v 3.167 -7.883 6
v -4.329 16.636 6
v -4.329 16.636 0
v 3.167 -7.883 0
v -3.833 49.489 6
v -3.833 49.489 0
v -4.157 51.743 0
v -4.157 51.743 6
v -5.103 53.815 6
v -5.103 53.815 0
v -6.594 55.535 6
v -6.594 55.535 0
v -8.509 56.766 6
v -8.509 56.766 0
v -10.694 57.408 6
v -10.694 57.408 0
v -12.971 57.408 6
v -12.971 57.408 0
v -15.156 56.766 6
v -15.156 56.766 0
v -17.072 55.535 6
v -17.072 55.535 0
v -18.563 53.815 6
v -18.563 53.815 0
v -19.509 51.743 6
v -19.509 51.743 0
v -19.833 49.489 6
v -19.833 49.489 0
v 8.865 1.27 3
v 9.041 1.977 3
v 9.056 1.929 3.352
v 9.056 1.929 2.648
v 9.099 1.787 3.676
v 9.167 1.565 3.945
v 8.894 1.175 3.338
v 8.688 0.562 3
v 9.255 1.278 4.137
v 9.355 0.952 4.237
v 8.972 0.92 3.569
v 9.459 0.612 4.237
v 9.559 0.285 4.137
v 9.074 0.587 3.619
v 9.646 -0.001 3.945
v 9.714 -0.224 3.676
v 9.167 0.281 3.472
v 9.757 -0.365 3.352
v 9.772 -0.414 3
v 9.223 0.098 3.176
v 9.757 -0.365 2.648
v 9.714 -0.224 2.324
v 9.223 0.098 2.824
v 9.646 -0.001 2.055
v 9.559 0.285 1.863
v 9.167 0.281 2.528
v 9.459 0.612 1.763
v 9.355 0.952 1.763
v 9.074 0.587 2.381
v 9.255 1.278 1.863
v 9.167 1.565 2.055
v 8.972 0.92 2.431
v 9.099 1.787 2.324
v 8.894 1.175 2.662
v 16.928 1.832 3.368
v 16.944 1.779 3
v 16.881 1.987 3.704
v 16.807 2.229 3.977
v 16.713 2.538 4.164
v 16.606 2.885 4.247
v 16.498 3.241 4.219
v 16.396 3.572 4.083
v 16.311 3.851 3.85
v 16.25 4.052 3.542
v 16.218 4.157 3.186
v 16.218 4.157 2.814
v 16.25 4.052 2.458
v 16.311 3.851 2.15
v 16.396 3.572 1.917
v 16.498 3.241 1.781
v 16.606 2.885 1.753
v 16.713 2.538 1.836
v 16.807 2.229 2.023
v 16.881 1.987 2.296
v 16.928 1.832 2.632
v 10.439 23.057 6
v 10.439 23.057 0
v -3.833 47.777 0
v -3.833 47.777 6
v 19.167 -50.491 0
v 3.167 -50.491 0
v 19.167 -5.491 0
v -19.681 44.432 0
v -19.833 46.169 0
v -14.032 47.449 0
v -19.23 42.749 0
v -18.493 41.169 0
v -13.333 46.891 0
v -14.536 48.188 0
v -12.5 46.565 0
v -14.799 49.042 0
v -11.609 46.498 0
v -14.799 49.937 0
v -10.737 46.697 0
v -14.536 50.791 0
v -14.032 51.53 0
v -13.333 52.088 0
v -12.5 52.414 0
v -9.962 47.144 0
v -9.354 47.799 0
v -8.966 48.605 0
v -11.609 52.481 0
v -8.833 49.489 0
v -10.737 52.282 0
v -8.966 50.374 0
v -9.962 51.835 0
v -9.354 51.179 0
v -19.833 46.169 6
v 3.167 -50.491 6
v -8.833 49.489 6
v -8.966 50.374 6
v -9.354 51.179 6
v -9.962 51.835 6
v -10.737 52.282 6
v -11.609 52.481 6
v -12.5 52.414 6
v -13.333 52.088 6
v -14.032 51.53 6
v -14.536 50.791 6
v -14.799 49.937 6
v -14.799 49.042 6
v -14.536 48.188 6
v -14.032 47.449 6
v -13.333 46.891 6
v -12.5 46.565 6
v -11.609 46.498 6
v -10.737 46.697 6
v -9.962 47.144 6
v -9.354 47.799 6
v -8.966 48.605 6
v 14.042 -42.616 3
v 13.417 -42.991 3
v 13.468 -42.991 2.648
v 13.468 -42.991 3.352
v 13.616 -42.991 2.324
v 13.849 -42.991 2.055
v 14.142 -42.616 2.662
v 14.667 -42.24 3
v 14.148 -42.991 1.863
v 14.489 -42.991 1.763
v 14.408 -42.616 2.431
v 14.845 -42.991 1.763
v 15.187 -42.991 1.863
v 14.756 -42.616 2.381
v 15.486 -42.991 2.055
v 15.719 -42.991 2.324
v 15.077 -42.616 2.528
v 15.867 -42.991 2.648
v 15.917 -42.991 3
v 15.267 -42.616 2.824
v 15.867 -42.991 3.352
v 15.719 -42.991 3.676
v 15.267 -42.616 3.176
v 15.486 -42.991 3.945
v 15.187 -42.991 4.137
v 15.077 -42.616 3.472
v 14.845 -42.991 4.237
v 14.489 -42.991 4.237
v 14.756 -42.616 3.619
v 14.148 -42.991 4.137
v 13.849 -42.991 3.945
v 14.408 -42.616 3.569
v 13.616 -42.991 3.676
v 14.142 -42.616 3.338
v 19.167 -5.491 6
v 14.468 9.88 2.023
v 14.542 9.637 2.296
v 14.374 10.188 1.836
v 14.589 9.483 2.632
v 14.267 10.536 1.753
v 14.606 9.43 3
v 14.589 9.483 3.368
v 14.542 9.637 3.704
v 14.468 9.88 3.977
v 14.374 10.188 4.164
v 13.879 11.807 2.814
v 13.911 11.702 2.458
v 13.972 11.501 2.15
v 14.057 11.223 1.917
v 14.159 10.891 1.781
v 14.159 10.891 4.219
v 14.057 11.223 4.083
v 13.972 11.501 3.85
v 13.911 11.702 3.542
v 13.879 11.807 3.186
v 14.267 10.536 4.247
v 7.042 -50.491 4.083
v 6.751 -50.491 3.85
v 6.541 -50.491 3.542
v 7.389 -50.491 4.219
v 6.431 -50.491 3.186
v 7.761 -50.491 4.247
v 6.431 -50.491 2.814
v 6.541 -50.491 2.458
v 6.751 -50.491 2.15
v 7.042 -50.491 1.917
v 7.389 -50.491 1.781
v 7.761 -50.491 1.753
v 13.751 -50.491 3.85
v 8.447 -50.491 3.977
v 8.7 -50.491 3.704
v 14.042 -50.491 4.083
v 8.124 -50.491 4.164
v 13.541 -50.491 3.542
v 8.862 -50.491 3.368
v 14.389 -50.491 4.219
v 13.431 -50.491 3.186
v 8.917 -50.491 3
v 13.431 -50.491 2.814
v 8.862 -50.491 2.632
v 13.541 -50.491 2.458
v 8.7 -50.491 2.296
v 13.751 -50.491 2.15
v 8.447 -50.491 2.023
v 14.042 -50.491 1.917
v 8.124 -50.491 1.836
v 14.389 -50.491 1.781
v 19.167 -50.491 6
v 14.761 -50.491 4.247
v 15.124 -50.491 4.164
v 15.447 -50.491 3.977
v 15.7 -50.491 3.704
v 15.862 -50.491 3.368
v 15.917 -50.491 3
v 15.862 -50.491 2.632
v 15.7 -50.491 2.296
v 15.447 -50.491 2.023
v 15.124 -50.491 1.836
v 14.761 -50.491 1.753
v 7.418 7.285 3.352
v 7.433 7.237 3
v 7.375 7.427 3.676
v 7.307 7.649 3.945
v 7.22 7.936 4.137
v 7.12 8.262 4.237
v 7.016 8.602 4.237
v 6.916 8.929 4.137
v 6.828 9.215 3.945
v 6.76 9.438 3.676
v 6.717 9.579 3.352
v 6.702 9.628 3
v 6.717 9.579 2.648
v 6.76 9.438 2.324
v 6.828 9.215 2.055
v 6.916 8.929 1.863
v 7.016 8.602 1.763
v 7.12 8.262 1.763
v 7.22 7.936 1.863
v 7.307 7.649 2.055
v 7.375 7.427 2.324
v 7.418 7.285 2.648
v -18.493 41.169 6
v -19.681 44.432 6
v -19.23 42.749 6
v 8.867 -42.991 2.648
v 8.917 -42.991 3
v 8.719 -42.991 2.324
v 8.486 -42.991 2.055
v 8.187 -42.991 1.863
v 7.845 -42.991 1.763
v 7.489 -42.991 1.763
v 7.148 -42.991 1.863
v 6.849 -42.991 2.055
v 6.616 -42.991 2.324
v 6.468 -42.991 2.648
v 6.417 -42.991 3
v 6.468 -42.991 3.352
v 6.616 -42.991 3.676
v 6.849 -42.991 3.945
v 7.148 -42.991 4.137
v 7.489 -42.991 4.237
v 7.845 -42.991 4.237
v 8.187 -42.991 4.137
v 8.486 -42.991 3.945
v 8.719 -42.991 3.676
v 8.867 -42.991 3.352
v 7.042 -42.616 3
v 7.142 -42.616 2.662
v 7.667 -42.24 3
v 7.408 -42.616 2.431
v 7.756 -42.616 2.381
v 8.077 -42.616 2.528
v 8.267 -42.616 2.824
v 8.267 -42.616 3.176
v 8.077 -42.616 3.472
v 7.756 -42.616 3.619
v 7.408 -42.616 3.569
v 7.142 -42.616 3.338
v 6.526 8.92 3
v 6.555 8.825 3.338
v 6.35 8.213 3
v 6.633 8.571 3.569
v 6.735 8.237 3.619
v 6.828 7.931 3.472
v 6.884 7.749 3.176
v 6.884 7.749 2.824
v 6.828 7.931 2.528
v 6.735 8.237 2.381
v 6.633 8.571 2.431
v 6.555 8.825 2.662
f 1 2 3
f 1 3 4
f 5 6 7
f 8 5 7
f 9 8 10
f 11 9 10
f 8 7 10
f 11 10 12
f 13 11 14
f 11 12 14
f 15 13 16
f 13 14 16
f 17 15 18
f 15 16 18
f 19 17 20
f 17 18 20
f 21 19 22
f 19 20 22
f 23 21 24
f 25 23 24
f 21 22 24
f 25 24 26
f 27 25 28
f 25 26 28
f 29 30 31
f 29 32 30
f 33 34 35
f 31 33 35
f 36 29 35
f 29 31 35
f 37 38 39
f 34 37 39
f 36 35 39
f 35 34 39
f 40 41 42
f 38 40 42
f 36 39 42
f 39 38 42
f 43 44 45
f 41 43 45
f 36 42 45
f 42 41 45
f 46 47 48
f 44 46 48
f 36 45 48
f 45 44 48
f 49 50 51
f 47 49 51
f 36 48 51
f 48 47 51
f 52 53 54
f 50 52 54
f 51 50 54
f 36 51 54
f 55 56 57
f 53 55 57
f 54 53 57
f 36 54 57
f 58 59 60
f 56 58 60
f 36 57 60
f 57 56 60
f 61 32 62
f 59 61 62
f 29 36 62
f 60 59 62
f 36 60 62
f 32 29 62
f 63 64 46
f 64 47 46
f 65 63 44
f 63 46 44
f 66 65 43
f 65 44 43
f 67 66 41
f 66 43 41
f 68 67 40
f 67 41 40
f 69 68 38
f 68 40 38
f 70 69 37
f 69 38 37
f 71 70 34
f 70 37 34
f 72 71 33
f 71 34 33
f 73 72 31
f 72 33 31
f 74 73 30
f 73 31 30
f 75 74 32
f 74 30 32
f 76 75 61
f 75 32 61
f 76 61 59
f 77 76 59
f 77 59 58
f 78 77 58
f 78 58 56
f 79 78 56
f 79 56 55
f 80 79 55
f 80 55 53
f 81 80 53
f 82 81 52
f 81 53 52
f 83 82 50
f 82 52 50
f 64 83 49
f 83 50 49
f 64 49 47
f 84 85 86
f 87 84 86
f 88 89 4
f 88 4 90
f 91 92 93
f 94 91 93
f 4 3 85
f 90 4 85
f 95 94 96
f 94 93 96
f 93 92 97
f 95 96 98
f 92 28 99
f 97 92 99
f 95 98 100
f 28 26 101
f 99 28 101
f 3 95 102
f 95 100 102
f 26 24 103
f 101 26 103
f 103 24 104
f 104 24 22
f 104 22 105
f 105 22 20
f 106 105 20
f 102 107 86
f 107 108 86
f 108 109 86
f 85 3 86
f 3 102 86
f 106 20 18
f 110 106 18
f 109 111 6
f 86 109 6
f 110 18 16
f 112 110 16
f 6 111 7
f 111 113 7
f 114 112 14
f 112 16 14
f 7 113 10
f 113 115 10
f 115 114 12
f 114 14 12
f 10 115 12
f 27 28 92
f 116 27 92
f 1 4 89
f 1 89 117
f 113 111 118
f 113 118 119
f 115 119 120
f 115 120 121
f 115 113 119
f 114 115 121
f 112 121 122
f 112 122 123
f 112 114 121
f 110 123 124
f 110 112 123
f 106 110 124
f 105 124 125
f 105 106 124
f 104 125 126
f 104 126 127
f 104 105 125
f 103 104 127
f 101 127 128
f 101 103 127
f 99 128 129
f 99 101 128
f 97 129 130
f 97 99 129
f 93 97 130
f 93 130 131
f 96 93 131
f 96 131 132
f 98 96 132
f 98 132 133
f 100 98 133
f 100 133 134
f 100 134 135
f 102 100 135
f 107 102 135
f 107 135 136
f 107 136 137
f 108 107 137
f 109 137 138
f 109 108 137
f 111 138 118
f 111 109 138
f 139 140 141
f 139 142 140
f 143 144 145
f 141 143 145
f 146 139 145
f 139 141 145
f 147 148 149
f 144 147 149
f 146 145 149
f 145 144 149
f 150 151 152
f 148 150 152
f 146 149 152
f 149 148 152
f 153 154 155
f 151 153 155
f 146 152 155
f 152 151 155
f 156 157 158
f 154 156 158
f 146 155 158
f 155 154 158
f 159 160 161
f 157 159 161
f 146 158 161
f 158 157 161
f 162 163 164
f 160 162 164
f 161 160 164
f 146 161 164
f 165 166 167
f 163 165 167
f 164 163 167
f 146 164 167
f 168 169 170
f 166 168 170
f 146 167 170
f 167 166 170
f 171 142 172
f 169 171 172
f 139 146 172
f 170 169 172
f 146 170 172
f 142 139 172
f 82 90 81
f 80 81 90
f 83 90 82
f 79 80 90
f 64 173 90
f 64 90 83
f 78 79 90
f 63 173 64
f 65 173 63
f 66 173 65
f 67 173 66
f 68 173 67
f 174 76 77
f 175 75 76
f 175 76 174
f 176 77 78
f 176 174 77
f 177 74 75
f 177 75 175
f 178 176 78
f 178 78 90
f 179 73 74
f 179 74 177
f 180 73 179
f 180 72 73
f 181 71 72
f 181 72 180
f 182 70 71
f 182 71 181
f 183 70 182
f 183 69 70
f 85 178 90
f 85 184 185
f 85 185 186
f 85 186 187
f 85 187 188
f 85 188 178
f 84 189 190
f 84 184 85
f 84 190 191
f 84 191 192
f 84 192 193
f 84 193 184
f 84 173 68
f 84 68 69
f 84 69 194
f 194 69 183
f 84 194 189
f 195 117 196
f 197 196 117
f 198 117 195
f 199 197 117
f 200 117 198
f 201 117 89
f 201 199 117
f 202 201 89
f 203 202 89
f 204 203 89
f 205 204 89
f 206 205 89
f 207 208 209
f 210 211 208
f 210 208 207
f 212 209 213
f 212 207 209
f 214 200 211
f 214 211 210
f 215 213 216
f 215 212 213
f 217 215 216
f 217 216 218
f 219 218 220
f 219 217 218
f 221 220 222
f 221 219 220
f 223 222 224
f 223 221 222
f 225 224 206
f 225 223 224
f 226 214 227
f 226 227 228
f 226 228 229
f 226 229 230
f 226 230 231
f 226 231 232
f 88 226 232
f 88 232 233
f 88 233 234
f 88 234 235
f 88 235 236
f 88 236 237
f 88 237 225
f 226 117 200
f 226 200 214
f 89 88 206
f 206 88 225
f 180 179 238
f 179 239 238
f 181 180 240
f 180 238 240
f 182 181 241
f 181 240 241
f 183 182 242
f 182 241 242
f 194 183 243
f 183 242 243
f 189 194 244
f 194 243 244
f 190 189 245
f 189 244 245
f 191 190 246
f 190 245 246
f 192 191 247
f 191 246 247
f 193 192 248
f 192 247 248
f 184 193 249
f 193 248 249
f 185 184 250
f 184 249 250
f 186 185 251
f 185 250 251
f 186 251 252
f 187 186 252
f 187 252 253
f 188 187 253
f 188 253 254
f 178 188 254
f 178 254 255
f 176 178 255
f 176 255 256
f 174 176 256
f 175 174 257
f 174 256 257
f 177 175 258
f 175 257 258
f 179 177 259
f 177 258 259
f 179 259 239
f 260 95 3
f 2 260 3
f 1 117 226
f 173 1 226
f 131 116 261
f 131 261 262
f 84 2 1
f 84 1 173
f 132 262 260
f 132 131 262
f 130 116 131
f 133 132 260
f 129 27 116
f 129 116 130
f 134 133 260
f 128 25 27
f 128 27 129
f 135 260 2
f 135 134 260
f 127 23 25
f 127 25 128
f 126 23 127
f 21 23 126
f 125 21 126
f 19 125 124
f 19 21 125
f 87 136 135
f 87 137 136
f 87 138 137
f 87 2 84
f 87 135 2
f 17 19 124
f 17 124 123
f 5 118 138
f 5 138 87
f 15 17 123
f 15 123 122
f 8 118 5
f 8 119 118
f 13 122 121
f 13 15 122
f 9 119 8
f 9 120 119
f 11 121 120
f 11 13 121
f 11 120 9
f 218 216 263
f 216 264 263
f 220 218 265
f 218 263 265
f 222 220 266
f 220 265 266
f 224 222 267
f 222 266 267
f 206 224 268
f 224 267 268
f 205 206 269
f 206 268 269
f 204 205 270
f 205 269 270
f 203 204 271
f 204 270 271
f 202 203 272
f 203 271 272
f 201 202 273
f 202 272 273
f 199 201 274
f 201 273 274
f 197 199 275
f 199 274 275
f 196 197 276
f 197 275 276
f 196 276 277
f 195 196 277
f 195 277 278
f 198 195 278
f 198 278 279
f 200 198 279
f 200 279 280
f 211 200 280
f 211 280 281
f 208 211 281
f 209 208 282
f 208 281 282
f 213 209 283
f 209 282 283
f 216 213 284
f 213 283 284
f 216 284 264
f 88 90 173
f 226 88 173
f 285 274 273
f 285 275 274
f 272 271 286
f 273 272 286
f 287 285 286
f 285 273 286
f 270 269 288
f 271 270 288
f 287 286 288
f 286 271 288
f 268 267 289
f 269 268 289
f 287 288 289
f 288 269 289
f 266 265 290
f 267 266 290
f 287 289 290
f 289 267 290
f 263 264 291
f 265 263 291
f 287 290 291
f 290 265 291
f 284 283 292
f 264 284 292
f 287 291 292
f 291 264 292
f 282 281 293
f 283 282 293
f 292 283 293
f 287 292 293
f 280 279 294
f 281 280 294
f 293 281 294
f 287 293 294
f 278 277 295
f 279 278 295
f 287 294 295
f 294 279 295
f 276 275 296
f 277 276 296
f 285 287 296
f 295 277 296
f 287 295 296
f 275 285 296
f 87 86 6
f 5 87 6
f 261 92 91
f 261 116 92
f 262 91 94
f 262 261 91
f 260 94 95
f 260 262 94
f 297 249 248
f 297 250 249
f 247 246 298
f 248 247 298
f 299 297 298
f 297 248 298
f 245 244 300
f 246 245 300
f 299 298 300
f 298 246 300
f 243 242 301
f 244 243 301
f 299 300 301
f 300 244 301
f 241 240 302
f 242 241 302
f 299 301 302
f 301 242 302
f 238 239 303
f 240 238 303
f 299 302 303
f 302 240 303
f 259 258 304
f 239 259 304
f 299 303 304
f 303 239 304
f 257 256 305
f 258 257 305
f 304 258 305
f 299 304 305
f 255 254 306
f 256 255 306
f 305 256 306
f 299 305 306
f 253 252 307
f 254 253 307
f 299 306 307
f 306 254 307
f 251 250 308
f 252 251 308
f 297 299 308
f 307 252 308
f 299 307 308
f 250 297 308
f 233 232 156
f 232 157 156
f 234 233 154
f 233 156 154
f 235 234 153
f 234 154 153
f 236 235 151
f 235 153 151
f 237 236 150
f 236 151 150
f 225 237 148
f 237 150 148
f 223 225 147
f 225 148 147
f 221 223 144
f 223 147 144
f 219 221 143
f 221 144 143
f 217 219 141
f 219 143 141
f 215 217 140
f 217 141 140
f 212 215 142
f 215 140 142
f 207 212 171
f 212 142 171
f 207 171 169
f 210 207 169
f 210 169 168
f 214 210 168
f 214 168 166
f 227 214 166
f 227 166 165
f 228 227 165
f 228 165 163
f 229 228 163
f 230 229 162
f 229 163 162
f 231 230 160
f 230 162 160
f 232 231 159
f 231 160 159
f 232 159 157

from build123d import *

# Parameters (mm, degrees)
SKETCH_1_R                       = 3
EXTRUDE_1_DEPTH                  = 6
SKETCH_2_W                       = 16
SKETCH_2_H                       = 26
SKETCH_2_R                       = 1.6
EXTRUDE_2_DEPTH                  = 6
FILLET_2_R                       = 10
FILLET_3_R                       = 2
SKETCH_3_W                       = 39.771534619
SKETCH_3_H                       = 15.568928143
CUT_EXTRUDE_1_DEPTH              = 16
HOLE_WIZARD_M3_1_D               = 2.5
HOLE_WIZARD_M3_1_DEPTH           = 7.5
HOLE_WIZARD_M3_1_TIP             = 0.751075774
CUT_EXTRUDE_2_DEPTH              = 7
EXTRUDE_3_DEPTH                  = 6
HOLE_WIZARD_M3_3_D               = 2.5
HOLE_WIZARD_M3_3_DEPTH           = 7.5
HOLE_WIZARD_M3_3_TIP             = 0.751075774
HOLE_WIZARD_M3_3_ON_FACE_2_D     = 2.5
HOLE_WIZARD_M3_3_ON_FACE_2_DEPTH = 7.5
HOLE_WIZARD_M3_3_ON_FACE_2_TIP   = 0.751075774


with BuildPart() as part:
    # 草图1 → 凸台-拉伸1 (new body)
    with BuildSketch(Plane.XY):
        with BuildLine():
            Line((19.167299473, 7.939450352), (-3.832700527, 47.776618926))
            Line((-3.832700527, 47.776618926), (-3.832700527, 49.489431847))
            ThreePointArc((-3.832700527, 49.489431847), (-11.832700527, 57.489431847), (-19.832700527, 49.489431847))
            Line((-19.832700527, 49.489431847), (-19.832700527, 43.489431847))
            Line((-19.832700527, 43.489431847), (3.167299473, 3.652263273))
            Line((3.167299473, 3.652263273), (3.167299473, -56.491330266))
            Line((3.167299473, -56.491330266), (19.167299473, -56.491330266))
            Line((19.167299473, -56.491330266), (19.167299473, 7.939450352))
        make_face()
        with Locations((-11.832700527, 49.489431847)):
            Circle(SKETCH_1_R, mode=Mode.SUBTRACT)
    extrude(amount=EXTRUDE_1_DEPTH)

    # 草图2 → 凸台-拉伸2 (add)
    with BuildSketch(Plane.XZ.offset(56.491330266)):
        with Locations((11.167299473, -7)):
            Rectangle(SKETCH_2_W, SKETCH_2_H)
        with Locations((7.167299473, -8)):
            Circle(SKETCH_2_R, mode=Mode.SUBTRACT)
        with Locations((15.167299473, -15)):
            Circle(SKETCH_2_R, mode=Mode.SUBTRACT)
    extrude(amount=-EXTRUDE_2_DEPTH)

    # 圆角2
    fillet_2_edges = [part.edges().sort_by_distance(p)[0] for p in [
        (-19.832700527, 43.489431847, 3),
    ]]
    fillet(fillet_2_edges, radius=FILLET_2_R)

    # 圆角3
    fillet_3_edges = [part.edges().sort_by_distance(p)[0] for p in [
        (3.167299473, -53.491330266, -20),
        (19.167299473, -53.491330266, -20),
    ]]
    fillet(fillet_3_edges, radius=FILLET_3_R)

    # 草图3 → 切除-拉伸1 (cut)
    with BuildSketch(Plane(origin=(19.167299473, 0, 0), x_dir=(0, 0, -1), z_dir=(1, 0, 0))):
        with Locations((8.066218502, -58.275794338)):
            Rectangle(SKETCH_3_W, SKETCH_3_H)
    extrude(amount=-CUT_EXTRUDE_1_DEPTH, mode=Mode.SUBTRACT)

    # M3 螺纹孔1
    with Locations(Plane(origin=(0, -50.491330266, 0), x_dir=(-1, 0, 0), z_dir=(0, -1, 0))):
        with Locations((-7.667299473, -3), (-14.667299473, -3)):
            Hole(HOLE_WIZARD_M3_1_D / 2, depth=HOLE_WIZARD_M3_1_DEPTH)
            with Locations((0, 0, -(HOLE_WIZARD_M3_1_DEPTH + HOLE_WIZARD_M3_1_TIP / 2))):  # 118° drill point
                Cone(0, HOLE_WIZARD_M3_1_D / 2, HOLE_WIZARD_M3_1_TIP, mode=Mode.SUBTRACT)

    # 草图9 → 切除-拉伸2 (cut, through all)
    with BuildSketch(Plane.XY.offset(6)):
        Polygon((10.439222522, 23.056923084), (29.925755937, 19.338586327), (19.167299473, -5.491330266), align=None)
    extrude(amount=-CUT_EXTRUDE_2_DEPTH, mode=Mode.SUBTRACT)

    # 草图12 → 凸台-拉伸3 (add)
    with BuildSketch(Plane.XY.offset(6)):
        Polygon((-4.328668805, 16.635661183), (3.167299473, -7.882546288), (3.167299473, 3.652263273), align=None)
    extrude(amount=-EXTRUDE_3_DEPTH)

    # M3 螺纹孔3
    with Locations(Plane(origin=(14.240054683, 10.624961257, 3), x_dir=(-0.292371705, 0.956304756, 0), z_dir=(0.956304756, 0.292371705, 0))):
        with Locations((0, 0)):
            Hole(HOLE_WIZARD_M3_3_D / 2, depth=HOLE_WIZARD_M3_3_DEPTH)
            with Locations((0, 0, -(HOLE_WIZARD_M3_3_DEPTH + HOLE_WIZARD_M3_3_TIP / 2))):  # 118° drill point
                Cone(0, HOLE_WIZARD_M3_3_D / 2, HOLE_WIZARD_M3_3_TIP, mode=Mode.SUBTRACT)

    # M3 螺纹孔3 on face 2
    with Locations(Plane(origin=(16.579028321, 2.974523209, 3), x_dir=(-0.292371907, 0.956304694, 0), z_dir=(0.956304694, 0.292371907, 0))):
        with Locations((0, 0)):
            Hole(HOLE_WIZARD_M3_3_ON_FACE_2_D / 2, depth=HOLE_WIZARD_M3_3_ON_FACE_2_DEPTH)
            with Locations((0, 0, -(HOLE_WIZARD_M3_3_ON_FACE_2_DEPTH + HOLE_WIZARD_M3_3_ON_FACE_2_TIP / 2))):  # 118° drill point
                Cone(0, HOLE_WIZARD_M3_3_ON_FACE_2_D / 2, HOLE_WIZARD_M3_3_ON_FACE_2_TIP, mode=Mode.SUBTRACT)


solid = part.part
